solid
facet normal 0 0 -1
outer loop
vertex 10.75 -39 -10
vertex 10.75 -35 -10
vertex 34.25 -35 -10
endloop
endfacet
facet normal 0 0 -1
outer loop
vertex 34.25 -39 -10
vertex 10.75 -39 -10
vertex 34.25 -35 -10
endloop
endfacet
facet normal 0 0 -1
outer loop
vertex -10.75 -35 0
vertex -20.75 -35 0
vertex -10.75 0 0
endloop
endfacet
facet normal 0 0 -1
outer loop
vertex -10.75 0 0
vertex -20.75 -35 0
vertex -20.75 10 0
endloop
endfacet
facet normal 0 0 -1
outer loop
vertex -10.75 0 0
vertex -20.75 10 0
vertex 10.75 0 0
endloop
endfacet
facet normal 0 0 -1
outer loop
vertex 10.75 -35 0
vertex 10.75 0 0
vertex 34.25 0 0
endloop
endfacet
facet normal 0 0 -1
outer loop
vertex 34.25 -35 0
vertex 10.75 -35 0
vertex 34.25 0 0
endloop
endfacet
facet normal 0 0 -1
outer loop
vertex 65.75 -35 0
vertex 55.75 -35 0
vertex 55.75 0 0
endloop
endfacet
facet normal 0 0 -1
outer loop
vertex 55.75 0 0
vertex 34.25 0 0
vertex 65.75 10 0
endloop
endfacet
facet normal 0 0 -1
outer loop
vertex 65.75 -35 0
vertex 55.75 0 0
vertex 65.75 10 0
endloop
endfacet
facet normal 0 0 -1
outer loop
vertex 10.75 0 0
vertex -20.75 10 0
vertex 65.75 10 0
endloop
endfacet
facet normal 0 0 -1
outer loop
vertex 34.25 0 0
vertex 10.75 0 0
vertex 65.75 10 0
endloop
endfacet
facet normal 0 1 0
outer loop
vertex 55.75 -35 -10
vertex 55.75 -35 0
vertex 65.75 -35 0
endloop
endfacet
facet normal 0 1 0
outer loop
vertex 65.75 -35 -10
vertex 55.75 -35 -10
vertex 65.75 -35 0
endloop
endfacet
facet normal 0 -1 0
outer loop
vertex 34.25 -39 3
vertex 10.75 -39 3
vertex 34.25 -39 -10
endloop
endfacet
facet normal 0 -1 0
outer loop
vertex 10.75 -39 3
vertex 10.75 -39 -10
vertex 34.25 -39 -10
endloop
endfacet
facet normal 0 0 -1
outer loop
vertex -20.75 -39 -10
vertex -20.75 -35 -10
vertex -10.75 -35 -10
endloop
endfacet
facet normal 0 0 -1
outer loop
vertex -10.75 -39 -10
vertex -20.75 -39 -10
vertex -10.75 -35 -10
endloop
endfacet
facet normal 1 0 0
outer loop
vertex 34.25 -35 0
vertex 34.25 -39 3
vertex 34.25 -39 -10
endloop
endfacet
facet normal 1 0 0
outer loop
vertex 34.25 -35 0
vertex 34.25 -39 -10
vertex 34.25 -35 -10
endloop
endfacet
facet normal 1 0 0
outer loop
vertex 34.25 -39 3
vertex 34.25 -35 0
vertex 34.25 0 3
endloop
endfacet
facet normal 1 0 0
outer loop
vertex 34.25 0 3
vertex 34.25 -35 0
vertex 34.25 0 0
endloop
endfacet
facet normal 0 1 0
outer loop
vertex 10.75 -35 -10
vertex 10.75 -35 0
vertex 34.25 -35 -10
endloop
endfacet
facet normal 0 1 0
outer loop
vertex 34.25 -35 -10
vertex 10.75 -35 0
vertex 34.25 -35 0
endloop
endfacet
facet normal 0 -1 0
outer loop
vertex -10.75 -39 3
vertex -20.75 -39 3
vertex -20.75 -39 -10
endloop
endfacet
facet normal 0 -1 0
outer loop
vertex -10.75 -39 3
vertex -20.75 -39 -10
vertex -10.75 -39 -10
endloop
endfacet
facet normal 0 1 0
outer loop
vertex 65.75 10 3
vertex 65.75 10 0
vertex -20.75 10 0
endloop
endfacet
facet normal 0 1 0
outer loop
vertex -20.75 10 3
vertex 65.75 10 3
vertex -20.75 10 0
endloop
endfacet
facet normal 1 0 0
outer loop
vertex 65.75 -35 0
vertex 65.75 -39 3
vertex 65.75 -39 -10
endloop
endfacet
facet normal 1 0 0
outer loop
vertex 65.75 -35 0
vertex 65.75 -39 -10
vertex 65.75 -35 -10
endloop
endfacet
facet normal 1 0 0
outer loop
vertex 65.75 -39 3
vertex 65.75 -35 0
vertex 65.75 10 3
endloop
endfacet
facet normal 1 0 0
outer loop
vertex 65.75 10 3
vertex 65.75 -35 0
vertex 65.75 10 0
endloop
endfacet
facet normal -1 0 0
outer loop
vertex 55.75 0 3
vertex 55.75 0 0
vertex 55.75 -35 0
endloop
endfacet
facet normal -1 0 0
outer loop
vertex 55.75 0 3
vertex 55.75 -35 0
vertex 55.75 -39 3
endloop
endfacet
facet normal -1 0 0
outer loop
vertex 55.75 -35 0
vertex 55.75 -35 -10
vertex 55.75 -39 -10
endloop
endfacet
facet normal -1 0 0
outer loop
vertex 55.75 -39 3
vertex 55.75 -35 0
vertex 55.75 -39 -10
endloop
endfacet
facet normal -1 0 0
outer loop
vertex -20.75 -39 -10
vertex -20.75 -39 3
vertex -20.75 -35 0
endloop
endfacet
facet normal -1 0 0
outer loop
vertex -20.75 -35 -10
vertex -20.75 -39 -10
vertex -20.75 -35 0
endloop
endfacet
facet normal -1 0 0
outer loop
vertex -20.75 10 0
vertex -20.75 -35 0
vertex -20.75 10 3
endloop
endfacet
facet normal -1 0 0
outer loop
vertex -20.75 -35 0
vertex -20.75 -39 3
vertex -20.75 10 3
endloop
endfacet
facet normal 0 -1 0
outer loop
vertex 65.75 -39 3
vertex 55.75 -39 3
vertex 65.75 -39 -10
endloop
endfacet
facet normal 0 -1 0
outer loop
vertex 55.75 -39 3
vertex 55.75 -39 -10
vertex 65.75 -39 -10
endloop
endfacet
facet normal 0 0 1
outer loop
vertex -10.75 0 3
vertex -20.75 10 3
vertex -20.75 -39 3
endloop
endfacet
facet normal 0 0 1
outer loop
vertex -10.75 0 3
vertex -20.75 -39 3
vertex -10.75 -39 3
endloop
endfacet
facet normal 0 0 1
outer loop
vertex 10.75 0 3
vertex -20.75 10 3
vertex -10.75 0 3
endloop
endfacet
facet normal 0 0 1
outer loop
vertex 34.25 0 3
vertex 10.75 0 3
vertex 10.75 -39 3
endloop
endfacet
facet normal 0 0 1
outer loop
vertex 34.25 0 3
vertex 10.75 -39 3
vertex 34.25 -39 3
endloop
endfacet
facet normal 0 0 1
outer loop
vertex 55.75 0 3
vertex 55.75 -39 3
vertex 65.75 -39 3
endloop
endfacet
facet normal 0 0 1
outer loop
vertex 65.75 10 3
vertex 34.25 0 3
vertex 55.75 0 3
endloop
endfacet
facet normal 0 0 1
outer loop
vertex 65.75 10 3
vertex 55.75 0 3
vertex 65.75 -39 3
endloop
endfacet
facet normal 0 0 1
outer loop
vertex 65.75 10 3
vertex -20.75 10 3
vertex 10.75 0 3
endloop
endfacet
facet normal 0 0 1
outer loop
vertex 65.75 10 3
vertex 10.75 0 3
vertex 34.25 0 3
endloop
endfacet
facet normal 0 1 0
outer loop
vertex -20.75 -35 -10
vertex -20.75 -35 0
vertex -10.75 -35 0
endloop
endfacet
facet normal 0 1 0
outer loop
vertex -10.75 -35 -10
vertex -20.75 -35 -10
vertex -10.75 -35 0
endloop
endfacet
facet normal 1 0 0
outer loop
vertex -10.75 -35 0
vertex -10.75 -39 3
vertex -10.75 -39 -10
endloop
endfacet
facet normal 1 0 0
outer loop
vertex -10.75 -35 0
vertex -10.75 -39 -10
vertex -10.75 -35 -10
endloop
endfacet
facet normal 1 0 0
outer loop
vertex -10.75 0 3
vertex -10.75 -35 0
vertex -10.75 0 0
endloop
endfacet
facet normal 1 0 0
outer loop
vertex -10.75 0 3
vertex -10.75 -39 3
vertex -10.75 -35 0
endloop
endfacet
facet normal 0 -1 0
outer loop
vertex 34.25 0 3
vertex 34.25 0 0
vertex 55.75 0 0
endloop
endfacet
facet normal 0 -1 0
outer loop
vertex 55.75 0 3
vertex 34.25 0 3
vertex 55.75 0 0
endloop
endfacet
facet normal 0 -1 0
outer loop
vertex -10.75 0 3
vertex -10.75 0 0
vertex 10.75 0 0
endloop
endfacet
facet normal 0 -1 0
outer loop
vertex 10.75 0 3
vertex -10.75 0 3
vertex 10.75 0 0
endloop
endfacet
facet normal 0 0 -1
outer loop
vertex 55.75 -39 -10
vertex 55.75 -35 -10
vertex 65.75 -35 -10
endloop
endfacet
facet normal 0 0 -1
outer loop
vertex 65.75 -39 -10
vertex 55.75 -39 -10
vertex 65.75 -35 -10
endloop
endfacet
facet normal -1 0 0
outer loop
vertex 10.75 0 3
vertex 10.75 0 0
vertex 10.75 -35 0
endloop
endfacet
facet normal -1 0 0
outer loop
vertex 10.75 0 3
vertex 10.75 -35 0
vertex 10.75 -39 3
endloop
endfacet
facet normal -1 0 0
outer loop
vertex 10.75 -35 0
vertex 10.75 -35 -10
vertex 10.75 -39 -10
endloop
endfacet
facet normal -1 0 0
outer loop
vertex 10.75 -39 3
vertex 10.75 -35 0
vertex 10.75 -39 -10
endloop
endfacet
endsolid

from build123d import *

# Parameters (mm, degrees)
F0_W     = 10
F0_H     = 4
F0_W_2   = 23.5
F1_DEPTH = 3
F2_DEPTH = 10


with BuildPart() as f1:
    # F0 (on Top) → F1 (new body)
    with BuildSketch(Plane.XY):
        Polygon((-10.75, -35), (-10.75, 0), (10.75, 0), (10.75, -35), (34.25, -35), (34.25, 0), (55.75, 0), (55.75, -35), (65.75, -35), (65.75, 10), (-20.75, 10), (-20.75, -35), align=None)
        with Locations((-15.75, -37)):
            Rectangle(F0_W, F0_H)
        with Locations((22.5, -37)):
            Rectangle(F0_W_2, F0_H)
        with Locations((60.75, -37)):
            Rectangle(F0_W, F0_H)
    extrude(amount=F1_DEPTH)

    # F0 (on Top) → F2 (join)
    with BuildSketch(Plane.XY):
        with Locations((-15.75, -37)):
            Rectangle(F0_W, F0_H)
        with Locations((22.5, -37)):
            Rectangle(F0_W_2, F0_H)
        with Locations((60.75, -37)):
            Rectangle(F0_W, F0_H)
    extrude(amount=-F2_DEPTH)


solid = f1.part
